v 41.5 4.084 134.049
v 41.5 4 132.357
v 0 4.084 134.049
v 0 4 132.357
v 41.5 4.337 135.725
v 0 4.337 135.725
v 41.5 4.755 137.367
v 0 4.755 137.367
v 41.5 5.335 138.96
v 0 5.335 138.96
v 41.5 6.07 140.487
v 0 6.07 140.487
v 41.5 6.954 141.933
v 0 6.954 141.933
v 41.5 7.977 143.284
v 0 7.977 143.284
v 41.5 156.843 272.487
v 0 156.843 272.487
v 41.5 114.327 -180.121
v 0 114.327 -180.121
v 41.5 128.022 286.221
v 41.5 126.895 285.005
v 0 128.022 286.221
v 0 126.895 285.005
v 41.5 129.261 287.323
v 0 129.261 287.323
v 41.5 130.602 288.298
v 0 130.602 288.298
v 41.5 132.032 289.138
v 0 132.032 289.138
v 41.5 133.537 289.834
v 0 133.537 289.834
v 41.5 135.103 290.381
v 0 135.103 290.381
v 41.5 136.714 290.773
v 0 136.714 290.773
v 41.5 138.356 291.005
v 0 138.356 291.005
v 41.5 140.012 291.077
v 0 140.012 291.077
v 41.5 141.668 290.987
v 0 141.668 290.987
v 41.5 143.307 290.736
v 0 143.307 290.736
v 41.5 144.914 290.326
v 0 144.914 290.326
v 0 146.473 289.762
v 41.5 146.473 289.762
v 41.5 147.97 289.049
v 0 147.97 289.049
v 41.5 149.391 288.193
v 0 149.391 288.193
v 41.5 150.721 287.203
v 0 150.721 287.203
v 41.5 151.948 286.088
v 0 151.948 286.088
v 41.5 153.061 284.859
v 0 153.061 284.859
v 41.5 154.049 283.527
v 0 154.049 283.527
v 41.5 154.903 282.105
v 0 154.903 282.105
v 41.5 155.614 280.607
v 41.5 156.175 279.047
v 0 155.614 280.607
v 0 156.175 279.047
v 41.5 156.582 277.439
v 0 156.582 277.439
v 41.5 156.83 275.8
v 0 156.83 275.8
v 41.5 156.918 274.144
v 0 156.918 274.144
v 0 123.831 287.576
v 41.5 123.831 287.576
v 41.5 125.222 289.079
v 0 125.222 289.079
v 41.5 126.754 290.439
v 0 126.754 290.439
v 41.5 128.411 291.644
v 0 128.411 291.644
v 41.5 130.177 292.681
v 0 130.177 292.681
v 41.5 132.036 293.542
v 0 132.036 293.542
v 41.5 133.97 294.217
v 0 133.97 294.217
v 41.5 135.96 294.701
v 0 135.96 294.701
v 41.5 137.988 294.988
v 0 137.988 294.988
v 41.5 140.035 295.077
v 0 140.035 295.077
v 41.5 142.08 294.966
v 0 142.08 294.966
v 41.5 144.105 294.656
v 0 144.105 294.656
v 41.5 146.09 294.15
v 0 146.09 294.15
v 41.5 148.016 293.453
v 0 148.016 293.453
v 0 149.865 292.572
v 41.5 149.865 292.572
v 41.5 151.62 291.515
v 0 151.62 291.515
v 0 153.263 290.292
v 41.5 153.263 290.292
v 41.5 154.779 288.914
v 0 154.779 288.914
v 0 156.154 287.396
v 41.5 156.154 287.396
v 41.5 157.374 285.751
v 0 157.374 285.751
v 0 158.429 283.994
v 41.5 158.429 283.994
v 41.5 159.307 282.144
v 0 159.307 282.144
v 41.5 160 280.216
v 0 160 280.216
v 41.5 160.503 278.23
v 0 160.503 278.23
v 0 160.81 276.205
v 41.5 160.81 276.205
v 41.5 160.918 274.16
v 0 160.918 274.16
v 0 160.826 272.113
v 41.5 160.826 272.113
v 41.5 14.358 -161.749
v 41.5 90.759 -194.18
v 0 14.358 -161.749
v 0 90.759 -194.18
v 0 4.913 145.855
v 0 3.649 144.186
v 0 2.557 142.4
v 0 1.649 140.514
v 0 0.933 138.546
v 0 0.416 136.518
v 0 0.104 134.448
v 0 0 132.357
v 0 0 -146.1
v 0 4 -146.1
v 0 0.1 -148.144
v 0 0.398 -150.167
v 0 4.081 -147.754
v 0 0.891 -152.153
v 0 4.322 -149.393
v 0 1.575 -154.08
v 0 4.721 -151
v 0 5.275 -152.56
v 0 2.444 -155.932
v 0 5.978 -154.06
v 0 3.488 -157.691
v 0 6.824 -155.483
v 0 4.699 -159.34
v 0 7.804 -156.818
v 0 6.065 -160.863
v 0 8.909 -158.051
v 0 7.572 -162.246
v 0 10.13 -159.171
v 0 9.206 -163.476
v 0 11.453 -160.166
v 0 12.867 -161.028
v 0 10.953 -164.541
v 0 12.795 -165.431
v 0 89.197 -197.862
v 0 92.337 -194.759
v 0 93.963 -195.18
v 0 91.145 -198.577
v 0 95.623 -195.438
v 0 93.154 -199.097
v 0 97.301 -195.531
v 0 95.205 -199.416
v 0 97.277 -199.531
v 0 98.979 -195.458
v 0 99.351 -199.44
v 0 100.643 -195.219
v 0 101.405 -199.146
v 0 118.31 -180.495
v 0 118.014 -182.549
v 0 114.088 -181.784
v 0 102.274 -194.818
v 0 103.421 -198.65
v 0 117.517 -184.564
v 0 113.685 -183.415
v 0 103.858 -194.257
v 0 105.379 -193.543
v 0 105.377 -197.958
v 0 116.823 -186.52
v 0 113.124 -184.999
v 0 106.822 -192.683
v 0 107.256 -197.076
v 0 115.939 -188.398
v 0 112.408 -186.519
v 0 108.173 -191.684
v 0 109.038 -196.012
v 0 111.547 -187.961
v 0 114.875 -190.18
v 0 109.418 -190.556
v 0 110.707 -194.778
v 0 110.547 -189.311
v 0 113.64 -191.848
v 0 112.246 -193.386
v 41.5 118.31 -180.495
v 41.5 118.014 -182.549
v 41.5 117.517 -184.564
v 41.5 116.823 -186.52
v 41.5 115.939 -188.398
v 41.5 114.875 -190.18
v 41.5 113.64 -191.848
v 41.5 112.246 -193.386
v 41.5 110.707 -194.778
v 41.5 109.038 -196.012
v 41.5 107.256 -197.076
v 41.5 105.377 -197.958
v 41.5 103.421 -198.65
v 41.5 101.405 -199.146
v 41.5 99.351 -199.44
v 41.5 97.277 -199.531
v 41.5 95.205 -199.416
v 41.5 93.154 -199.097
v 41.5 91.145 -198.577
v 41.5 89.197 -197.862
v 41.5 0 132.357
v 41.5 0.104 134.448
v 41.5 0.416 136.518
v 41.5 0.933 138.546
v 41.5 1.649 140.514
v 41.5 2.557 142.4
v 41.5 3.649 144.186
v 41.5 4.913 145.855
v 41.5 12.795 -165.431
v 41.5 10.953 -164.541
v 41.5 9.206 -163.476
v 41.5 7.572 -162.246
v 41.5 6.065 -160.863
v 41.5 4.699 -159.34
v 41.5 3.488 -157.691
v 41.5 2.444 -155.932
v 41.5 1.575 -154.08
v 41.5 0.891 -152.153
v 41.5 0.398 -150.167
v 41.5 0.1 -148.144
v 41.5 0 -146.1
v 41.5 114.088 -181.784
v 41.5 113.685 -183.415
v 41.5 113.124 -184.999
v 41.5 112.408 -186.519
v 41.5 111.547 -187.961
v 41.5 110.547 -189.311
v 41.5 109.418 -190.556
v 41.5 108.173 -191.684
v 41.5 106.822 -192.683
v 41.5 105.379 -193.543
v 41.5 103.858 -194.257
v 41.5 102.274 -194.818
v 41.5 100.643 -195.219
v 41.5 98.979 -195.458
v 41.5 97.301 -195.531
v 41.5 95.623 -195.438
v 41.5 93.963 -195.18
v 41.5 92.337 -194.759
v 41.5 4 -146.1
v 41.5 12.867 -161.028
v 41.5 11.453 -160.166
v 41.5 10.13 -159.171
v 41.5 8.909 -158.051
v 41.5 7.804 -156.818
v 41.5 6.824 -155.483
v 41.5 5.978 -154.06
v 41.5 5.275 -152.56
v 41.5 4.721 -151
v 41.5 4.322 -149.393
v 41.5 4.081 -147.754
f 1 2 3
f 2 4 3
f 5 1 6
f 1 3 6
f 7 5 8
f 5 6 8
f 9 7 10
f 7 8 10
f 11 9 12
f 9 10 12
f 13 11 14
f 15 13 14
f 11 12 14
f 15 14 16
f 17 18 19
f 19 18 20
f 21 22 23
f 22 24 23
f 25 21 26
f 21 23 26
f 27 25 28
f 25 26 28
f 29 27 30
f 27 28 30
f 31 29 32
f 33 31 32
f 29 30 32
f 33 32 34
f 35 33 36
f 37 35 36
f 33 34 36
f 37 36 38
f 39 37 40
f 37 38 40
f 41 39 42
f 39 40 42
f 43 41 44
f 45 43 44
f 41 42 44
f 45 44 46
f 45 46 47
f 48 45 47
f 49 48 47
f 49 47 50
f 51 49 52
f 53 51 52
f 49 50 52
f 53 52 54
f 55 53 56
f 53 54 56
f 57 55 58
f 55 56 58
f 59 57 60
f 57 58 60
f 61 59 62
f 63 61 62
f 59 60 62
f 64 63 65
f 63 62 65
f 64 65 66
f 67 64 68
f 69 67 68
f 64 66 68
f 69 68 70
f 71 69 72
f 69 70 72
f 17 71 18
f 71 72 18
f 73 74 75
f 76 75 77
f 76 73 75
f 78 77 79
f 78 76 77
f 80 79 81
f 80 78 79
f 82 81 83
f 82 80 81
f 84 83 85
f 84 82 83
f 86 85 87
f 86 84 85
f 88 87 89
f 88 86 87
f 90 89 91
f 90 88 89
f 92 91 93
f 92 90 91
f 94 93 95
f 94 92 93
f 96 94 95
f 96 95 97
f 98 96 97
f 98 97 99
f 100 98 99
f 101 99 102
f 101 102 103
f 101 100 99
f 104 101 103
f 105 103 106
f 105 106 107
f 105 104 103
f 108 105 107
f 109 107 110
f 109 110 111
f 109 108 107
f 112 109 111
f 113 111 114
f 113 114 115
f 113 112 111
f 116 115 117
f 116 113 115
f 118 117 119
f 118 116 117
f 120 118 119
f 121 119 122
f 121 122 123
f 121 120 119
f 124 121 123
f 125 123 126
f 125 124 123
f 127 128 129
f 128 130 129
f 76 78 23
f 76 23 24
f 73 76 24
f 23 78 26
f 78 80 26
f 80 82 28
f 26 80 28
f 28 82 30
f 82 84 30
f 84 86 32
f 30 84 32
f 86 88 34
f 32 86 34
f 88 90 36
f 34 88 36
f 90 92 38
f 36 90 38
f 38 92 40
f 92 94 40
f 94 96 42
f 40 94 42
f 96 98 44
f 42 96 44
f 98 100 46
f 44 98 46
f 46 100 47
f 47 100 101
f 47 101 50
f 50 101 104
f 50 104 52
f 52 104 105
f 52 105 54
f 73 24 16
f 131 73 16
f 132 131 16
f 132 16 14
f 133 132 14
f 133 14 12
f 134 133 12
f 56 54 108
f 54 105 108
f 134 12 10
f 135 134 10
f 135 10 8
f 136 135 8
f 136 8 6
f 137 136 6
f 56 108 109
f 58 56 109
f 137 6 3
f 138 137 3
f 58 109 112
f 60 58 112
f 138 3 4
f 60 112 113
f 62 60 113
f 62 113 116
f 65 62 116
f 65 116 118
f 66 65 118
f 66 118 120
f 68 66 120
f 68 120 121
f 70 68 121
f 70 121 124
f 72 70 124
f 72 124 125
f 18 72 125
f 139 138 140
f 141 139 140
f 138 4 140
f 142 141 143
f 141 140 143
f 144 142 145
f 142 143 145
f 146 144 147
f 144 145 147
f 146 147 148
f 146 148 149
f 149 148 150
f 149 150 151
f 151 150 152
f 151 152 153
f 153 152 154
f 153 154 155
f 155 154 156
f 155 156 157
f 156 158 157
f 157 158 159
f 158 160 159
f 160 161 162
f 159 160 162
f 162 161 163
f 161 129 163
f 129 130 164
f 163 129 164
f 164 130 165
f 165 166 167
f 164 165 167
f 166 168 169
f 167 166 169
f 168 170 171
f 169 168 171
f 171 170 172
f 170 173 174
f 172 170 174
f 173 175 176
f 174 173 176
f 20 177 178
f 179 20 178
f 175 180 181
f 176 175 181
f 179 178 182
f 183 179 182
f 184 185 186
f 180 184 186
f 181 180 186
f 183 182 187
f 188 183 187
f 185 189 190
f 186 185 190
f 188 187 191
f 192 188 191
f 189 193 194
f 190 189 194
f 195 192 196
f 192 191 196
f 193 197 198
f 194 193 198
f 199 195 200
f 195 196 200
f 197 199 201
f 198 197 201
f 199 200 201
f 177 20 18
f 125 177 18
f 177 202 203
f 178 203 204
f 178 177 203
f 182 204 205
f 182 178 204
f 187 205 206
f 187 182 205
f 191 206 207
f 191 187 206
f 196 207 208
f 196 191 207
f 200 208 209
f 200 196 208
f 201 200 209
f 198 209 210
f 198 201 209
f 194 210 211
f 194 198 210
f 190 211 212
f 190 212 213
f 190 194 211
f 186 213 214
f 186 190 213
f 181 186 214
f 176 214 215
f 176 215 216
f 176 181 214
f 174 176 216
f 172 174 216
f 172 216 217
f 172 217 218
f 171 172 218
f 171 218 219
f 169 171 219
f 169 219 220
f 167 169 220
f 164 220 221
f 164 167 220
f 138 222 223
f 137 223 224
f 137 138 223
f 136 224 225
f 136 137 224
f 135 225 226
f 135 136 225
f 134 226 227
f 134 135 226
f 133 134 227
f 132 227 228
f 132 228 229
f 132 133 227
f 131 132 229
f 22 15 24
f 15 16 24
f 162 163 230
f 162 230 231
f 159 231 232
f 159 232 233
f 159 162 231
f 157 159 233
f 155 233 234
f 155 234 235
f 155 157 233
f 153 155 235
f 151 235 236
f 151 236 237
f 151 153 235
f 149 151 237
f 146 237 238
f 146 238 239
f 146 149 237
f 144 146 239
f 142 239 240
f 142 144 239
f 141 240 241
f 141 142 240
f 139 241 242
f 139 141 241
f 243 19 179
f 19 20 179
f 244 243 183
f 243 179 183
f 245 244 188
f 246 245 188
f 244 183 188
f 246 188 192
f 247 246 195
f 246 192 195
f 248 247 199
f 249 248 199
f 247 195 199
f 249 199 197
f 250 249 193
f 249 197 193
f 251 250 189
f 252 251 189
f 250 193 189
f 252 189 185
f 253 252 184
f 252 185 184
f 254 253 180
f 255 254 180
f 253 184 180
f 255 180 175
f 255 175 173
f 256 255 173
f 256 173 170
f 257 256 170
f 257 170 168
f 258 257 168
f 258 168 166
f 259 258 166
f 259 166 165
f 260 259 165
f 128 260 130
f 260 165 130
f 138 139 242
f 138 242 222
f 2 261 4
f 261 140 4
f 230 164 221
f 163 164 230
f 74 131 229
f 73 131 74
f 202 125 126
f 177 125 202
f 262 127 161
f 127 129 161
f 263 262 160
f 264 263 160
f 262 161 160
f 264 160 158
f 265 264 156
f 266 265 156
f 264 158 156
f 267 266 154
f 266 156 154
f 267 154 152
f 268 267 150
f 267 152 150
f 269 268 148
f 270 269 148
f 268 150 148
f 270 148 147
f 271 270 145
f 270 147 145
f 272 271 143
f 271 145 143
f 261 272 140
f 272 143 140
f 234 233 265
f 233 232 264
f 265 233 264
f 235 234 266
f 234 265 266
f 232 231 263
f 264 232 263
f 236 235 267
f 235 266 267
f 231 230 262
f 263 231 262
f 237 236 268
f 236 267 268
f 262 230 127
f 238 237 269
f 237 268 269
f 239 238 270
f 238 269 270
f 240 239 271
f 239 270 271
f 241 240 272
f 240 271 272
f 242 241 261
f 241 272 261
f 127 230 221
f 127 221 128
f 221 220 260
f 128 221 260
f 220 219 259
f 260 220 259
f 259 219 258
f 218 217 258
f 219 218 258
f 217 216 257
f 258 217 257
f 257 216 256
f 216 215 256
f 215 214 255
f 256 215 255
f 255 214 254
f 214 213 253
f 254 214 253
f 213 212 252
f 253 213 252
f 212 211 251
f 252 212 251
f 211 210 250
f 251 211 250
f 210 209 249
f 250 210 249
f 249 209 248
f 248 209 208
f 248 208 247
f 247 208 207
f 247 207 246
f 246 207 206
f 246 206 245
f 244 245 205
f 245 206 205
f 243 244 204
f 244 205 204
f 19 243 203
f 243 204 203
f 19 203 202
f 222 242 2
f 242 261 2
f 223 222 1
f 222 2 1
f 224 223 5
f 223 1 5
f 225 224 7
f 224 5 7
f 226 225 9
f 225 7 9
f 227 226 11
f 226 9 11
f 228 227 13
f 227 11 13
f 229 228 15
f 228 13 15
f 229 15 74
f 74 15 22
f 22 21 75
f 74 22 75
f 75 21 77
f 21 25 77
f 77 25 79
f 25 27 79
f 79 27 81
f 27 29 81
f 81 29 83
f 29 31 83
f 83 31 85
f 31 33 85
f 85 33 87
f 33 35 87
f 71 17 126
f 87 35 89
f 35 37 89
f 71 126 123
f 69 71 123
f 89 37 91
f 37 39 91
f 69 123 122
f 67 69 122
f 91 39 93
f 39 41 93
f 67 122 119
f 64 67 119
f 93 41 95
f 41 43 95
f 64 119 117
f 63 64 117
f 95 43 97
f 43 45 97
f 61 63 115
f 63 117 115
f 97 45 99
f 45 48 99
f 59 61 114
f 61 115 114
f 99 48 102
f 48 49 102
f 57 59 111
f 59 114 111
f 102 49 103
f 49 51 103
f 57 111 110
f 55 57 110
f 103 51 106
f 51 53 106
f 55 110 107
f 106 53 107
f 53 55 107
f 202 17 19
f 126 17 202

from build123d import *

# Parameters (mm, degrees)
EXTRUDE_1_DEPTH     = 3
EXTRUDE_2_DEPTH     = 38.5
CUT_EXTRUDE_5_DEPTH = 3


with BuildPart() as part:
    # 草图1 → 凸台-拉伸1 (new body)
    with BuildSketch(Plane(origin=(0, 0, 0), x_dir=(0, 0, -1), z_dir=(1, 0, 0))):
        with BuildLine():
            Line((-132.35662508, 0), (146.100403215, 0))
            ThreePointArc((146.100403215, 0), (157.691079906, 3.488397737), (165.431005137, 12.794646302))
            Line((165.431005137, 12.794646302), (197.861688802, 89.196549138))
            ThreePointArc((197.861688802, 89.196549138), (196.566084988, 108.16010172), (180.495077268, 118.30986165))
            Line((180.495077268, 118.30986165), (-272.113220038, 160.825649707))
            ThreePointArc((-272.113220038, 160.825649707), (-293.452890241, 148.016026014), (-287.575750229, 123.830757588))
            Line((-287.575750229, 123.830757588), (-145.855164884, 4.913066695))
            ThreePointArc((-145.855164884, 4.913066695), (-139.53904809, 1.266454963), (-132.35662508, 0))
        make_face()
    extrude(amount=EXTRUDE_1_DEPTH)

    # 草图2 → 凸台-拉伸2 (add)
    with BuildSketch(Plane(origin=(3, 0, 0), x_dir=(0, 0, -1), z_dir=(1, 0, 0))):
        with BuildLine():
            Line((-272.113220038, 160.825649707), (180.495077268, 118.30986165))
            ThreePointArc((180.495077268, 118.30986165), (196.566084988, 108.16010172), (197.861688802, 89.196549138))
            Line((197.861688802, 89.196549138), (165.431005137, 12.794646302))
            ThreePointArc((165.431005137, 12.794646302), (157.691079906, 3.488397737), (146.100403215, 0))
            Line((146.100403215, 0), (-132.35662508, 0))
            ThreePointArc((-132.35662508, 0), (-139.53904809, 1.266454963), (-145.855164884, 4.913066695))
            Line((-145.855164884, 4.913066695), (-287.575750229, 123.830757588))
            ThreePointArc((-287.575750229, 123.830757588), (-293.452890241, 148.016026014), (-272.113220038, 160.825649707))
        make_face()
        with BuildLine():
            Line((-272.487313445, 156.843181362), (180.120983861, 114.327393305))
            ThreePointArc((180.120983861, 114.327393305), (193.130847253, 106.110920981), (194.179669388, 90.759473652))
            Line((194.179669388, 90.759473652), (161.748985724, 14.357570816))
            ThreePointArc((161.748985724, 14.357570816), (155.483331965, 6.823941025), (146.100403215, 4))
            Line((146.100403215, 4), (-132.35662508, 4))
            ThreePointArc((-132.35662508, 4), (-138.170967517, 5.025225447), (-143.284014445, 7.977244467))
            Line((-143.284014445, 7.977244467), (-285.004599791, 126.894935361))
            ThreePointArc((-285.004599791, 126.894935361), (-289.762284562, 146.473485991), (-272.487313445, 156.843181362))
        make_face(mode=Mode.SUBTRACT)
    extrude(amount=EXTRUDE_2_DEPTH)

    # 草图4 → 切除-拉伸5 (cut)
    with BuildSketch(Plane(origin=(3, 0, 0), x_dir=(0, 0, -1), z_dir=(1, 0, 0))):
        with BuildLine():
            Line((-272.487313445, 156.843181362), (180.120983861, 114.327393305))
            ThreePointArc((180.120983861, 114.327393305), (193.130847253, 106.110920981), (194.179669388, 90.759473652))
            Line((194.179669388, 90.759473652), (161.748985724, 14.357570816))
            ThreePointArc((161.748985724, 14.357570816), (155.483331965, 6.823941025), (146.100403215, 4))
            Line((146.100403215, 4), (-132.35662508, 4))
            ThreePointArc((-132.35662508, 4), (-138.170967517, 5.025225447), (-143.284014445, 7.977244467))
            Line((-143.284014445, 7.977244467), (-285.004599791, 126.894935361))
            ThreePointArc((-285.004599791, 126.894935361), (-289.762284562, 146.473485991), (-272.487313445, 156.843181362))
        make_face()
    extrude(amount=-CUT_EXTRUDE_5_DEPTH, mode=Mode.SUBTRACT)


solid = part.part
